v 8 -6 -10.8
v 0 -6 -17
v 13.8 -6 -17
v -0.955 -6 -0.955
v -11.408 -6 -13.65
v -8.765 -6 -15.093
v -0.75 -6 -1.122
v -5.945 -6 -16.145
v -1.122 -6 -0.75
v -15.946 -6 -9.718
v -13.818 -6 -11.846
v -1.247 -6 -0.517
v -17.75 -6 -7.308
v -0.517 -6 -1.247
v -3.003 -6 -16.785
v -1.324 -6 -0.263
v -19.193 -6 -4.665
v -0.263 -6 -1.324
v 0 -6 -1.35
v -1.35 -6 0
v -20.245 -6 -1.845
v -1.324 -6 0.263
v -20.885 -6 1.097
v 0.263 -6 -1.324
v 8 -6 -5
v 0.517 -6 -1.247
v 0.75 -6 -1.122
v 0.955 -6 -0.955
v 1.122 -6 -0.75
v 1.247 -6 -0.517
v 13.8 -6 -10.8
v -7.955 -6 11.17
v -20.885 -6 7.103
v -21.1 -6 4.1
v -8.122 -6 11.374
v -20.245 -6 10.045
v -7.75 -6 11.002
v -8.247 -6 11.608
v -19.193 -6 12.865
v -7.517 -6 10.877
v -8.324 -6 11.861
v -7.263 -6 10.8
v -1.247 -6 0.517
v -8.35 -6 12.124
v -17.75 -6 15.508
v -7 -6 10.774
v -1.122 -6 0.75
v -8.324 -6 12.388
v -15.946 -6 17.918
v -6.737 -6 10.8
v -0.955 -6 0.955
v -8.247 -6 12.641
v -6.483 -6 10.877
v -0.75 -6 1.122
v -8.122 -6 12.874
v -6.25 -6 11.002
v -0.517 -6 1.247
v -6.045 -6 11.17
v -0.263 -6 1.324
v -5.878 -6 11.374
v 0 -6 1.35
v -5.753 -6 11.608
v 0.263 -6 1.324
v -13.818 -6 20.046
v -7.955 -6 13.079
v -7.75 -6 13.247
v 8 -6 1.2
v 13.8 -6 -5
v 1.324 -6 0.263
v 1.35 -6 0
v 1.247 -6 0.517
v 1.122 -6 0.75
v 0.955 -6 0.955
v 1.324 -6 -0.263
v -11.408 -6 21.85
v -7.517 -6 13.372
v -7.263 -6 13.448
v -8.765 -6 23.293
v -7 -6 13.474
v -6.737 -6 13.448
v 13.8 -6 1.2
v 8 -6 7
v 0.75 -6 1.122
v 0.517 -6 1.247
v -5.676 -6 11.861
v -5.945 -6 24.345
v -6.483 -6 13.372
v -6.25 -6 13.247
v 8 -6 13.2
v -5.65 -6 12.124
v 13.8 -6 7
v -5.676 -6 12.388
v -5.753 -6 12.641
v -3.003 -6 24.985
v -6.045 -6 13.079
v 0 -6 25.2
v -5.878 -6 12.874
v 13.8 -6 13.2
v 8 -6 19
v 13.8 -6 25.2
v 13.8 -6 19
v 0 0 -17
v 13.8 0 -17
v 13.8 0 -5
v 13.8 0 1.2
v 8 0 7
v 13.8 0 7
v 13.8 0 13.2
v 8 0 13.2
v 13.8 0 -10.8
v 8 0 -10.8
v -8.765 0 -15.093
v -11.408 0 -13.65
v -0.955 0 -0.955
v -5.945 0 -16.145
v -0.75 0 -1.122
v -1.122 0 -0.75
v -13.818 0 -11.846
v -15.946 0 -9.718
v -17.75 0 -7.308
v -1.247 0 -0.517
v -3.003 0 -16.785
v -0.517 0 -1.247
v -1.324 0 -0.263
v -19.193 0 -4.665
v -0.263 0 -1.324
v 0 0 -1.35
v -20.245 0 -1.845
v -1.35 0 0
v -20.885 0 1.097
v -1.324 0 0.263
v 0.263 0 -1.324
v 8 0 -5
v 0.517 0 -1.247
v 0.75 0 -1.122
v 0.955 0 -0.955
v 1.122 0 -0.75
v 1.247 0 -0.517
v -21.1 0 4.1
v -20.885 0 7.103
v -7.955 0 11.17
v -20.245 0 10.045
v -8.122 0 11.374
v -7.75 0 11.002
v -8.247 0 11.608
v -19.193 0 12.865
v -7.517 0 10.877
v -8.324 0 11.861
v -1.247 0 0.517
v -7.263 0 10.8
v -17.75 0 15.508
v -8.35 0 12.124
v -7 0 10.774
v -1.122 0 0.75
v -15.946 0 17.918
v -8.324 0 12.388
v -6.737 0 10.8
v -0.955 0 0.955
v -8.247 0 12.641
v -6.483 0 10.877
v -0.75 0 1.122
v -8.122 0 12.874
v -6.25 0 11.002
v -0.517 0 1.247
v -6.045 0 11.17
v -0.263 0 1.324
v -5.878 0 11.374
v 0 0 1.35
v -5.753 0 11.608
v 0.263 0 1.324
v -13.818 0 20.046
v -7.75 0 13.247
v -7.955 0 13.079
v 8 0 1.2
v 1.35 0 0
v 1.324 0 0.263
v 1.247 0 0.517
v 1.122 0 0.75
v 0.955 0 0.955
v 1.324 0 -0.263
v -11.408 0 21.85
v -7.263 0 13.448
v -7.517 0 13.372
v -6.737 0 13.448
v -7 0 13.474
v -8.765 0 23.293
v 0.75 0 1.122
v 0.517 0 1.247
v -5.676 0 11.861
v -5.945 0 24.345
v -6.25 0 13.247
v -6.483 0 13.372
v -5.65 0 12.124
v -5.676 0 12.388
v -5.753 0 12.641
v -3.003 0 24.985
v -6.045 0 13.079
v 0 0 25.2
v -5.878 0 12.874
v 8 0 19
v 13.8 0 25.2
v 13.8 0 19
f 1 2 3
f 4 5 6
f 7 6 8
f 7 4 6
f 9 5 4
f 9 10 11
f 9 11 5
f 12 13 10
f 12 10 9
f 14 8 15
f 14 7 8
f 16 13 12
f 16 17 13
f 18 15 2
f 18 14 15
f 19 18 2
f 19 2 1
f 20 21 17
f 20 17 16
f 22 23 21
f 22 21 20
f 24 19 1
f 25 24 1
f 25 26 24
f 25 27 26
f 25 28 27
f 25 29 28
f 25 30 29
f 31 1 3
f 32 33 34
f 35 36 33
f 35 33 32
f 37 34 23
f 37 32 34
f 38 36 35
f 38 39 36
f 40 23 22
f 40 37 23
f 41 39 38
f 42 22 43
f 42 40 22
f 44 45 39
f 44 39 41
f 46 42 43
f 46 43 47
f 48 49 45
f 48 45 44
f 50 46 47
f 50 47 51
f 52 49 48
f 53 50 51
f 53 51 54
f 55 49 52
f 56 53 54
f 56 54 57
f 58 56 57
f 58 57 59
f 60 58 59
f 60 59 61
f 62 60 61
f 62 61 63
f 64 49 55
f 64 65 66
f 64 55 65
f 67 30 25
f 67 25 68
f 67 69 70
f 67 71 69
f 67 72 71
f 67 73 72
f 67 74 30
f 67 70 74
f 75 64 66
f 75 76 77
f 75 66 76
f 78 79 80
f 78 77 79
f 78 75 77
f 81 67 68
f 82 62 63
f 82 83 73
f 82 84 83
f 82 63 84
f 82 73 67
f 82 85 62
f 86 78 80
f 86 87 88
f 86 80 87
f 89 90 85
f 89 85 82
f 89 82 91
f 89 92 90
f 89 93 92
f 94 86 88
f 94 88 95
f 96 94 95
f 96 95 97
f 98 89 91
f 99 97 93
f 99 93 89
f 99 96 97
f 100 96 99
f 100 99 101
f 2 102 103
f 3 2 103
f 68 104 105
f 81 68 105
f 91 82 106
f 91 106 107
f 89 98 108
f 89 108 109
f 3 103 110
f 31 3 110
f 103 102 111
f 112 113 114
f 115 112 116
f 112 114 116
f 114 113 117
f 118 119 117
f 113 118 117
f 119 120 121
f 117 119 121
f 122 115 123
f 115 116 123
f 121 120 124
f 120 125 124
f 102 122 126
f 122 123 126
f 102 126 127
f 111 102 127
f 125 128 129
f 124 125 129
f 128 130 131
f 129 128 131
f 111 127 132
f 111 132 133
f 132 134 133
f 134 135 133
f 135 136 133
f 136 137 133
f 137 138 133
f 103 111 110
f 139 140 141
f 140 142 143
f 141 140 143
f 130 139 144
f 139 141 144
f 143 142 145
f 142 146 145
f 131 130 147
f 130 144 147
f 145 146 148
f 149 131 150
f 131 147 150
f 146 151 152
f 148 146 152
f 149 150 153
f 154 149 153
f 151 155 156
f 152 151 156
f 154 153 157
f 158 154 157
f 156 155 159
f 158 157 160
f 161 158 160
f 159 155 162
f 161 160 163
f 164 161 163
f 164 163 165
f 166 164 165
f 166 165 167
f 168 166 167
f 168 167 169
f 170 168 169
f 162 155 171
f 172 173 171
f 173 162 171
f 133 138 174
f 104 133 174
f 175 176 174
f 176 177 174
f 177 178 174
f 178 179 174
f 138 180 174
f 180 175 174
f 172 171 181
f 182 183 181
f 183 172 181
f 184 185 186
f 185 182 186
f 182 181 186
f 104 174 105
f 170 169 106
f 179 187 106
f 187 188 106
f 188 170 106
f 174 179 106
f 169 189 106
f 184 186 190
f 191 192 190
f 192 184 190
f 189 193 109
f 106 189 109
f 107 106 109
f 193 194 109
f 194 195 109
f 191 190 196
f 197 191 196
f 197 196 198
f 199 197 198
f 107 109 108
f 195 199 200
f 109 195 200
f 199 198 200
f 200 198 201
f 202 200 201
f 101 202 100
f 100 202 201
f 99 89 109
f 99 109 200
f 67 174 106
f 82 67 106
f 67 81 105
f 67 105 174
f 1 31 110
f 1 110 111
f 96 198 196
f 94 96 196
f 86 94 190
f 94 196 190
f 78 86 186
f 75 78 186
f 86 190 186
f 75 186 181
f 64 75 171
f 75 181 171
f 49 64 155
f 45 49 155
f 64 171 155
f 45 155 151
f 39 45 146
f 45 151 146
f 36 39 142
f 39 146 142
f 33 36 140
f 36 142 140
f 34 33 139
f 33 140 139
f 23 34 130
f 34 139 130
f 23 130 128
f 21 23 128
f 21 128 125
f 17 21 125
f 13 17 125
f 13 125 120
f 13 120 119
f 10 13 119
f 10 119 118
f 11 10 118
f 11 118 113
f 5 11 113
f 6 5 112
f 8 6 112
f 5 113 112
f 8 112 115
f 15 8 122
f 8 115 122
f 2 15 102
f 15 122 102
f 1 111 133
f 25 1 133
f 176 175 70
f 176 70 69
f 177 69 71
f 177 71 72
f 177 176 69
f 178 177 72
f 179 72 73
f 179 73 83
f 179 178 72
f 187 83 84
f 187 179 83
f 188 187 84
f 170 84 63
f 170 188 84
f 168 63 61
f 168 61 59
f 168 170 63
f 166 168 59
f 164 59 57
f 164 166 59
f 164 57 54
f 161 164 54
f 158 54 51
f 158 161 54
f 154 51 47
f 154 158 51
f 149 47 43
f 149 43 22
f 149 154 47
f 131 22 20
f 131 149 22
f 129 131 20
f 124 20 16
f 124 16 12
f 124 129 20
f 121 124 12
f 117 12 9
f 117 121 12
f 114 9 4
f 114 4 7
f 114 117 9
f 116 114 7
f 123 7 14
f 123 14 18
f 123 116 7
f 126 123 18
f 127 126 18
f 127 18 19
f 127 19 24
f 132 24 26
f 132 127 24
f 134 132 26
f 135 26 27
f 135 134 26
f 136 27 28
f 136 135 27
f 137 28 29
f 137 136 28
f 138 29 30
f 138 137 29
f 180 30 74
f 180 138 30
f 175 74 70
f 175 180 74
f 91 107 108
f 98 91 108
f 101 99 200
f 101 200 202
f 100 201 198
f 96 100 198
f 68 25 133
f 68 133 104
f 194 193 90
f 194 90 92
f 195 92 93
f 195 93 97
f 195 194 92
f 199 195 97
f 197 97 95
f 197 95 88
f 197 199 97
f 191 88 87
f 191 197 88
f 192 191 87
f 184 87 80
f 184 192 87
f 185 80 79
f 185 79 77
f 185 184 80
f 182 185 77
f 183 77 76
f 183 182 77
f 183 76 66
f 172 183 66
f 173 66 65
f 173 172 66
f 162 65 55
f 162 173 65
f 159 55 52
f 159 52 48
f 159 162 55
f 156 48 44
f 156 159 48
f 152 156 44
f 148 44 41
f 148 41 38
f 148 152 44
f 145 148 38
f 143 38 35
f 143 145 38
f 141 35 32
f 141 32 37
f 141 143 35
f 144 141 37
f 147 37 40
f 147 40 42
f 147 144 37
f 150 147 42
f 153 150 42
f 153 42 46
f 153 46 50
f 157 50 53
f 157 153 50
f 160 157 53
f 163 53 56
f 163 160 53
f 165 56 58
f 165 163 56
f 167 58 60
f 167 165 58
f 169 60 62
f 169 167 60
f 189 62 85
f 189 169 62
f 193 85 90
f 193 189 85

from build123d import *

# Parameters (mm, degrees)
F0_R     = 1.35
F1_DEPTH = 6


with BuildPart() as f1:
    # F0 (on Front) → F1 (new body)
    with BuildSketch(Plane.XZ):
        with BuildLine():
            ThreePointArc((0, 25.2), (-21.1, 4.1), (0, -17))
            Line((0, -17), (13.8, -17))
            Line((13.8, -17), (13.8, -10.8))
            Line((13.8, -10.8), (8, -10.8))
            Line((8, -10.8), (8, -5))
            Line((8, -5), (13.8, -5))
            Line((13.8, -5), (13.8, 1.2))
            Line((13.8, 1.2), (8, 1.2))
            Line((8, 1.2), (8, 7))
            Line((8, 7), (13.8, 7))
            Line((13.8, 7), (13.8, 13.2))
            Line((13.8, 13.2), (8, 13.2))
            Line((8, 13.2), (8, 19))
            Line((8, 19), (13.8, 19))
            Line((13.8, 19), (13.8, 25.2))
            Line((13.8, 25.2), (0, 25.2))
        make_face()
        Circle(F0_R, mode=Mode.SUBTRACT)
        with Locations((-7, 12.124356)):
            Circle(F0_R, mode=Mode.SUBTRACT)
    extrude(amount=F1_DEPTH)


solid = f1.part
